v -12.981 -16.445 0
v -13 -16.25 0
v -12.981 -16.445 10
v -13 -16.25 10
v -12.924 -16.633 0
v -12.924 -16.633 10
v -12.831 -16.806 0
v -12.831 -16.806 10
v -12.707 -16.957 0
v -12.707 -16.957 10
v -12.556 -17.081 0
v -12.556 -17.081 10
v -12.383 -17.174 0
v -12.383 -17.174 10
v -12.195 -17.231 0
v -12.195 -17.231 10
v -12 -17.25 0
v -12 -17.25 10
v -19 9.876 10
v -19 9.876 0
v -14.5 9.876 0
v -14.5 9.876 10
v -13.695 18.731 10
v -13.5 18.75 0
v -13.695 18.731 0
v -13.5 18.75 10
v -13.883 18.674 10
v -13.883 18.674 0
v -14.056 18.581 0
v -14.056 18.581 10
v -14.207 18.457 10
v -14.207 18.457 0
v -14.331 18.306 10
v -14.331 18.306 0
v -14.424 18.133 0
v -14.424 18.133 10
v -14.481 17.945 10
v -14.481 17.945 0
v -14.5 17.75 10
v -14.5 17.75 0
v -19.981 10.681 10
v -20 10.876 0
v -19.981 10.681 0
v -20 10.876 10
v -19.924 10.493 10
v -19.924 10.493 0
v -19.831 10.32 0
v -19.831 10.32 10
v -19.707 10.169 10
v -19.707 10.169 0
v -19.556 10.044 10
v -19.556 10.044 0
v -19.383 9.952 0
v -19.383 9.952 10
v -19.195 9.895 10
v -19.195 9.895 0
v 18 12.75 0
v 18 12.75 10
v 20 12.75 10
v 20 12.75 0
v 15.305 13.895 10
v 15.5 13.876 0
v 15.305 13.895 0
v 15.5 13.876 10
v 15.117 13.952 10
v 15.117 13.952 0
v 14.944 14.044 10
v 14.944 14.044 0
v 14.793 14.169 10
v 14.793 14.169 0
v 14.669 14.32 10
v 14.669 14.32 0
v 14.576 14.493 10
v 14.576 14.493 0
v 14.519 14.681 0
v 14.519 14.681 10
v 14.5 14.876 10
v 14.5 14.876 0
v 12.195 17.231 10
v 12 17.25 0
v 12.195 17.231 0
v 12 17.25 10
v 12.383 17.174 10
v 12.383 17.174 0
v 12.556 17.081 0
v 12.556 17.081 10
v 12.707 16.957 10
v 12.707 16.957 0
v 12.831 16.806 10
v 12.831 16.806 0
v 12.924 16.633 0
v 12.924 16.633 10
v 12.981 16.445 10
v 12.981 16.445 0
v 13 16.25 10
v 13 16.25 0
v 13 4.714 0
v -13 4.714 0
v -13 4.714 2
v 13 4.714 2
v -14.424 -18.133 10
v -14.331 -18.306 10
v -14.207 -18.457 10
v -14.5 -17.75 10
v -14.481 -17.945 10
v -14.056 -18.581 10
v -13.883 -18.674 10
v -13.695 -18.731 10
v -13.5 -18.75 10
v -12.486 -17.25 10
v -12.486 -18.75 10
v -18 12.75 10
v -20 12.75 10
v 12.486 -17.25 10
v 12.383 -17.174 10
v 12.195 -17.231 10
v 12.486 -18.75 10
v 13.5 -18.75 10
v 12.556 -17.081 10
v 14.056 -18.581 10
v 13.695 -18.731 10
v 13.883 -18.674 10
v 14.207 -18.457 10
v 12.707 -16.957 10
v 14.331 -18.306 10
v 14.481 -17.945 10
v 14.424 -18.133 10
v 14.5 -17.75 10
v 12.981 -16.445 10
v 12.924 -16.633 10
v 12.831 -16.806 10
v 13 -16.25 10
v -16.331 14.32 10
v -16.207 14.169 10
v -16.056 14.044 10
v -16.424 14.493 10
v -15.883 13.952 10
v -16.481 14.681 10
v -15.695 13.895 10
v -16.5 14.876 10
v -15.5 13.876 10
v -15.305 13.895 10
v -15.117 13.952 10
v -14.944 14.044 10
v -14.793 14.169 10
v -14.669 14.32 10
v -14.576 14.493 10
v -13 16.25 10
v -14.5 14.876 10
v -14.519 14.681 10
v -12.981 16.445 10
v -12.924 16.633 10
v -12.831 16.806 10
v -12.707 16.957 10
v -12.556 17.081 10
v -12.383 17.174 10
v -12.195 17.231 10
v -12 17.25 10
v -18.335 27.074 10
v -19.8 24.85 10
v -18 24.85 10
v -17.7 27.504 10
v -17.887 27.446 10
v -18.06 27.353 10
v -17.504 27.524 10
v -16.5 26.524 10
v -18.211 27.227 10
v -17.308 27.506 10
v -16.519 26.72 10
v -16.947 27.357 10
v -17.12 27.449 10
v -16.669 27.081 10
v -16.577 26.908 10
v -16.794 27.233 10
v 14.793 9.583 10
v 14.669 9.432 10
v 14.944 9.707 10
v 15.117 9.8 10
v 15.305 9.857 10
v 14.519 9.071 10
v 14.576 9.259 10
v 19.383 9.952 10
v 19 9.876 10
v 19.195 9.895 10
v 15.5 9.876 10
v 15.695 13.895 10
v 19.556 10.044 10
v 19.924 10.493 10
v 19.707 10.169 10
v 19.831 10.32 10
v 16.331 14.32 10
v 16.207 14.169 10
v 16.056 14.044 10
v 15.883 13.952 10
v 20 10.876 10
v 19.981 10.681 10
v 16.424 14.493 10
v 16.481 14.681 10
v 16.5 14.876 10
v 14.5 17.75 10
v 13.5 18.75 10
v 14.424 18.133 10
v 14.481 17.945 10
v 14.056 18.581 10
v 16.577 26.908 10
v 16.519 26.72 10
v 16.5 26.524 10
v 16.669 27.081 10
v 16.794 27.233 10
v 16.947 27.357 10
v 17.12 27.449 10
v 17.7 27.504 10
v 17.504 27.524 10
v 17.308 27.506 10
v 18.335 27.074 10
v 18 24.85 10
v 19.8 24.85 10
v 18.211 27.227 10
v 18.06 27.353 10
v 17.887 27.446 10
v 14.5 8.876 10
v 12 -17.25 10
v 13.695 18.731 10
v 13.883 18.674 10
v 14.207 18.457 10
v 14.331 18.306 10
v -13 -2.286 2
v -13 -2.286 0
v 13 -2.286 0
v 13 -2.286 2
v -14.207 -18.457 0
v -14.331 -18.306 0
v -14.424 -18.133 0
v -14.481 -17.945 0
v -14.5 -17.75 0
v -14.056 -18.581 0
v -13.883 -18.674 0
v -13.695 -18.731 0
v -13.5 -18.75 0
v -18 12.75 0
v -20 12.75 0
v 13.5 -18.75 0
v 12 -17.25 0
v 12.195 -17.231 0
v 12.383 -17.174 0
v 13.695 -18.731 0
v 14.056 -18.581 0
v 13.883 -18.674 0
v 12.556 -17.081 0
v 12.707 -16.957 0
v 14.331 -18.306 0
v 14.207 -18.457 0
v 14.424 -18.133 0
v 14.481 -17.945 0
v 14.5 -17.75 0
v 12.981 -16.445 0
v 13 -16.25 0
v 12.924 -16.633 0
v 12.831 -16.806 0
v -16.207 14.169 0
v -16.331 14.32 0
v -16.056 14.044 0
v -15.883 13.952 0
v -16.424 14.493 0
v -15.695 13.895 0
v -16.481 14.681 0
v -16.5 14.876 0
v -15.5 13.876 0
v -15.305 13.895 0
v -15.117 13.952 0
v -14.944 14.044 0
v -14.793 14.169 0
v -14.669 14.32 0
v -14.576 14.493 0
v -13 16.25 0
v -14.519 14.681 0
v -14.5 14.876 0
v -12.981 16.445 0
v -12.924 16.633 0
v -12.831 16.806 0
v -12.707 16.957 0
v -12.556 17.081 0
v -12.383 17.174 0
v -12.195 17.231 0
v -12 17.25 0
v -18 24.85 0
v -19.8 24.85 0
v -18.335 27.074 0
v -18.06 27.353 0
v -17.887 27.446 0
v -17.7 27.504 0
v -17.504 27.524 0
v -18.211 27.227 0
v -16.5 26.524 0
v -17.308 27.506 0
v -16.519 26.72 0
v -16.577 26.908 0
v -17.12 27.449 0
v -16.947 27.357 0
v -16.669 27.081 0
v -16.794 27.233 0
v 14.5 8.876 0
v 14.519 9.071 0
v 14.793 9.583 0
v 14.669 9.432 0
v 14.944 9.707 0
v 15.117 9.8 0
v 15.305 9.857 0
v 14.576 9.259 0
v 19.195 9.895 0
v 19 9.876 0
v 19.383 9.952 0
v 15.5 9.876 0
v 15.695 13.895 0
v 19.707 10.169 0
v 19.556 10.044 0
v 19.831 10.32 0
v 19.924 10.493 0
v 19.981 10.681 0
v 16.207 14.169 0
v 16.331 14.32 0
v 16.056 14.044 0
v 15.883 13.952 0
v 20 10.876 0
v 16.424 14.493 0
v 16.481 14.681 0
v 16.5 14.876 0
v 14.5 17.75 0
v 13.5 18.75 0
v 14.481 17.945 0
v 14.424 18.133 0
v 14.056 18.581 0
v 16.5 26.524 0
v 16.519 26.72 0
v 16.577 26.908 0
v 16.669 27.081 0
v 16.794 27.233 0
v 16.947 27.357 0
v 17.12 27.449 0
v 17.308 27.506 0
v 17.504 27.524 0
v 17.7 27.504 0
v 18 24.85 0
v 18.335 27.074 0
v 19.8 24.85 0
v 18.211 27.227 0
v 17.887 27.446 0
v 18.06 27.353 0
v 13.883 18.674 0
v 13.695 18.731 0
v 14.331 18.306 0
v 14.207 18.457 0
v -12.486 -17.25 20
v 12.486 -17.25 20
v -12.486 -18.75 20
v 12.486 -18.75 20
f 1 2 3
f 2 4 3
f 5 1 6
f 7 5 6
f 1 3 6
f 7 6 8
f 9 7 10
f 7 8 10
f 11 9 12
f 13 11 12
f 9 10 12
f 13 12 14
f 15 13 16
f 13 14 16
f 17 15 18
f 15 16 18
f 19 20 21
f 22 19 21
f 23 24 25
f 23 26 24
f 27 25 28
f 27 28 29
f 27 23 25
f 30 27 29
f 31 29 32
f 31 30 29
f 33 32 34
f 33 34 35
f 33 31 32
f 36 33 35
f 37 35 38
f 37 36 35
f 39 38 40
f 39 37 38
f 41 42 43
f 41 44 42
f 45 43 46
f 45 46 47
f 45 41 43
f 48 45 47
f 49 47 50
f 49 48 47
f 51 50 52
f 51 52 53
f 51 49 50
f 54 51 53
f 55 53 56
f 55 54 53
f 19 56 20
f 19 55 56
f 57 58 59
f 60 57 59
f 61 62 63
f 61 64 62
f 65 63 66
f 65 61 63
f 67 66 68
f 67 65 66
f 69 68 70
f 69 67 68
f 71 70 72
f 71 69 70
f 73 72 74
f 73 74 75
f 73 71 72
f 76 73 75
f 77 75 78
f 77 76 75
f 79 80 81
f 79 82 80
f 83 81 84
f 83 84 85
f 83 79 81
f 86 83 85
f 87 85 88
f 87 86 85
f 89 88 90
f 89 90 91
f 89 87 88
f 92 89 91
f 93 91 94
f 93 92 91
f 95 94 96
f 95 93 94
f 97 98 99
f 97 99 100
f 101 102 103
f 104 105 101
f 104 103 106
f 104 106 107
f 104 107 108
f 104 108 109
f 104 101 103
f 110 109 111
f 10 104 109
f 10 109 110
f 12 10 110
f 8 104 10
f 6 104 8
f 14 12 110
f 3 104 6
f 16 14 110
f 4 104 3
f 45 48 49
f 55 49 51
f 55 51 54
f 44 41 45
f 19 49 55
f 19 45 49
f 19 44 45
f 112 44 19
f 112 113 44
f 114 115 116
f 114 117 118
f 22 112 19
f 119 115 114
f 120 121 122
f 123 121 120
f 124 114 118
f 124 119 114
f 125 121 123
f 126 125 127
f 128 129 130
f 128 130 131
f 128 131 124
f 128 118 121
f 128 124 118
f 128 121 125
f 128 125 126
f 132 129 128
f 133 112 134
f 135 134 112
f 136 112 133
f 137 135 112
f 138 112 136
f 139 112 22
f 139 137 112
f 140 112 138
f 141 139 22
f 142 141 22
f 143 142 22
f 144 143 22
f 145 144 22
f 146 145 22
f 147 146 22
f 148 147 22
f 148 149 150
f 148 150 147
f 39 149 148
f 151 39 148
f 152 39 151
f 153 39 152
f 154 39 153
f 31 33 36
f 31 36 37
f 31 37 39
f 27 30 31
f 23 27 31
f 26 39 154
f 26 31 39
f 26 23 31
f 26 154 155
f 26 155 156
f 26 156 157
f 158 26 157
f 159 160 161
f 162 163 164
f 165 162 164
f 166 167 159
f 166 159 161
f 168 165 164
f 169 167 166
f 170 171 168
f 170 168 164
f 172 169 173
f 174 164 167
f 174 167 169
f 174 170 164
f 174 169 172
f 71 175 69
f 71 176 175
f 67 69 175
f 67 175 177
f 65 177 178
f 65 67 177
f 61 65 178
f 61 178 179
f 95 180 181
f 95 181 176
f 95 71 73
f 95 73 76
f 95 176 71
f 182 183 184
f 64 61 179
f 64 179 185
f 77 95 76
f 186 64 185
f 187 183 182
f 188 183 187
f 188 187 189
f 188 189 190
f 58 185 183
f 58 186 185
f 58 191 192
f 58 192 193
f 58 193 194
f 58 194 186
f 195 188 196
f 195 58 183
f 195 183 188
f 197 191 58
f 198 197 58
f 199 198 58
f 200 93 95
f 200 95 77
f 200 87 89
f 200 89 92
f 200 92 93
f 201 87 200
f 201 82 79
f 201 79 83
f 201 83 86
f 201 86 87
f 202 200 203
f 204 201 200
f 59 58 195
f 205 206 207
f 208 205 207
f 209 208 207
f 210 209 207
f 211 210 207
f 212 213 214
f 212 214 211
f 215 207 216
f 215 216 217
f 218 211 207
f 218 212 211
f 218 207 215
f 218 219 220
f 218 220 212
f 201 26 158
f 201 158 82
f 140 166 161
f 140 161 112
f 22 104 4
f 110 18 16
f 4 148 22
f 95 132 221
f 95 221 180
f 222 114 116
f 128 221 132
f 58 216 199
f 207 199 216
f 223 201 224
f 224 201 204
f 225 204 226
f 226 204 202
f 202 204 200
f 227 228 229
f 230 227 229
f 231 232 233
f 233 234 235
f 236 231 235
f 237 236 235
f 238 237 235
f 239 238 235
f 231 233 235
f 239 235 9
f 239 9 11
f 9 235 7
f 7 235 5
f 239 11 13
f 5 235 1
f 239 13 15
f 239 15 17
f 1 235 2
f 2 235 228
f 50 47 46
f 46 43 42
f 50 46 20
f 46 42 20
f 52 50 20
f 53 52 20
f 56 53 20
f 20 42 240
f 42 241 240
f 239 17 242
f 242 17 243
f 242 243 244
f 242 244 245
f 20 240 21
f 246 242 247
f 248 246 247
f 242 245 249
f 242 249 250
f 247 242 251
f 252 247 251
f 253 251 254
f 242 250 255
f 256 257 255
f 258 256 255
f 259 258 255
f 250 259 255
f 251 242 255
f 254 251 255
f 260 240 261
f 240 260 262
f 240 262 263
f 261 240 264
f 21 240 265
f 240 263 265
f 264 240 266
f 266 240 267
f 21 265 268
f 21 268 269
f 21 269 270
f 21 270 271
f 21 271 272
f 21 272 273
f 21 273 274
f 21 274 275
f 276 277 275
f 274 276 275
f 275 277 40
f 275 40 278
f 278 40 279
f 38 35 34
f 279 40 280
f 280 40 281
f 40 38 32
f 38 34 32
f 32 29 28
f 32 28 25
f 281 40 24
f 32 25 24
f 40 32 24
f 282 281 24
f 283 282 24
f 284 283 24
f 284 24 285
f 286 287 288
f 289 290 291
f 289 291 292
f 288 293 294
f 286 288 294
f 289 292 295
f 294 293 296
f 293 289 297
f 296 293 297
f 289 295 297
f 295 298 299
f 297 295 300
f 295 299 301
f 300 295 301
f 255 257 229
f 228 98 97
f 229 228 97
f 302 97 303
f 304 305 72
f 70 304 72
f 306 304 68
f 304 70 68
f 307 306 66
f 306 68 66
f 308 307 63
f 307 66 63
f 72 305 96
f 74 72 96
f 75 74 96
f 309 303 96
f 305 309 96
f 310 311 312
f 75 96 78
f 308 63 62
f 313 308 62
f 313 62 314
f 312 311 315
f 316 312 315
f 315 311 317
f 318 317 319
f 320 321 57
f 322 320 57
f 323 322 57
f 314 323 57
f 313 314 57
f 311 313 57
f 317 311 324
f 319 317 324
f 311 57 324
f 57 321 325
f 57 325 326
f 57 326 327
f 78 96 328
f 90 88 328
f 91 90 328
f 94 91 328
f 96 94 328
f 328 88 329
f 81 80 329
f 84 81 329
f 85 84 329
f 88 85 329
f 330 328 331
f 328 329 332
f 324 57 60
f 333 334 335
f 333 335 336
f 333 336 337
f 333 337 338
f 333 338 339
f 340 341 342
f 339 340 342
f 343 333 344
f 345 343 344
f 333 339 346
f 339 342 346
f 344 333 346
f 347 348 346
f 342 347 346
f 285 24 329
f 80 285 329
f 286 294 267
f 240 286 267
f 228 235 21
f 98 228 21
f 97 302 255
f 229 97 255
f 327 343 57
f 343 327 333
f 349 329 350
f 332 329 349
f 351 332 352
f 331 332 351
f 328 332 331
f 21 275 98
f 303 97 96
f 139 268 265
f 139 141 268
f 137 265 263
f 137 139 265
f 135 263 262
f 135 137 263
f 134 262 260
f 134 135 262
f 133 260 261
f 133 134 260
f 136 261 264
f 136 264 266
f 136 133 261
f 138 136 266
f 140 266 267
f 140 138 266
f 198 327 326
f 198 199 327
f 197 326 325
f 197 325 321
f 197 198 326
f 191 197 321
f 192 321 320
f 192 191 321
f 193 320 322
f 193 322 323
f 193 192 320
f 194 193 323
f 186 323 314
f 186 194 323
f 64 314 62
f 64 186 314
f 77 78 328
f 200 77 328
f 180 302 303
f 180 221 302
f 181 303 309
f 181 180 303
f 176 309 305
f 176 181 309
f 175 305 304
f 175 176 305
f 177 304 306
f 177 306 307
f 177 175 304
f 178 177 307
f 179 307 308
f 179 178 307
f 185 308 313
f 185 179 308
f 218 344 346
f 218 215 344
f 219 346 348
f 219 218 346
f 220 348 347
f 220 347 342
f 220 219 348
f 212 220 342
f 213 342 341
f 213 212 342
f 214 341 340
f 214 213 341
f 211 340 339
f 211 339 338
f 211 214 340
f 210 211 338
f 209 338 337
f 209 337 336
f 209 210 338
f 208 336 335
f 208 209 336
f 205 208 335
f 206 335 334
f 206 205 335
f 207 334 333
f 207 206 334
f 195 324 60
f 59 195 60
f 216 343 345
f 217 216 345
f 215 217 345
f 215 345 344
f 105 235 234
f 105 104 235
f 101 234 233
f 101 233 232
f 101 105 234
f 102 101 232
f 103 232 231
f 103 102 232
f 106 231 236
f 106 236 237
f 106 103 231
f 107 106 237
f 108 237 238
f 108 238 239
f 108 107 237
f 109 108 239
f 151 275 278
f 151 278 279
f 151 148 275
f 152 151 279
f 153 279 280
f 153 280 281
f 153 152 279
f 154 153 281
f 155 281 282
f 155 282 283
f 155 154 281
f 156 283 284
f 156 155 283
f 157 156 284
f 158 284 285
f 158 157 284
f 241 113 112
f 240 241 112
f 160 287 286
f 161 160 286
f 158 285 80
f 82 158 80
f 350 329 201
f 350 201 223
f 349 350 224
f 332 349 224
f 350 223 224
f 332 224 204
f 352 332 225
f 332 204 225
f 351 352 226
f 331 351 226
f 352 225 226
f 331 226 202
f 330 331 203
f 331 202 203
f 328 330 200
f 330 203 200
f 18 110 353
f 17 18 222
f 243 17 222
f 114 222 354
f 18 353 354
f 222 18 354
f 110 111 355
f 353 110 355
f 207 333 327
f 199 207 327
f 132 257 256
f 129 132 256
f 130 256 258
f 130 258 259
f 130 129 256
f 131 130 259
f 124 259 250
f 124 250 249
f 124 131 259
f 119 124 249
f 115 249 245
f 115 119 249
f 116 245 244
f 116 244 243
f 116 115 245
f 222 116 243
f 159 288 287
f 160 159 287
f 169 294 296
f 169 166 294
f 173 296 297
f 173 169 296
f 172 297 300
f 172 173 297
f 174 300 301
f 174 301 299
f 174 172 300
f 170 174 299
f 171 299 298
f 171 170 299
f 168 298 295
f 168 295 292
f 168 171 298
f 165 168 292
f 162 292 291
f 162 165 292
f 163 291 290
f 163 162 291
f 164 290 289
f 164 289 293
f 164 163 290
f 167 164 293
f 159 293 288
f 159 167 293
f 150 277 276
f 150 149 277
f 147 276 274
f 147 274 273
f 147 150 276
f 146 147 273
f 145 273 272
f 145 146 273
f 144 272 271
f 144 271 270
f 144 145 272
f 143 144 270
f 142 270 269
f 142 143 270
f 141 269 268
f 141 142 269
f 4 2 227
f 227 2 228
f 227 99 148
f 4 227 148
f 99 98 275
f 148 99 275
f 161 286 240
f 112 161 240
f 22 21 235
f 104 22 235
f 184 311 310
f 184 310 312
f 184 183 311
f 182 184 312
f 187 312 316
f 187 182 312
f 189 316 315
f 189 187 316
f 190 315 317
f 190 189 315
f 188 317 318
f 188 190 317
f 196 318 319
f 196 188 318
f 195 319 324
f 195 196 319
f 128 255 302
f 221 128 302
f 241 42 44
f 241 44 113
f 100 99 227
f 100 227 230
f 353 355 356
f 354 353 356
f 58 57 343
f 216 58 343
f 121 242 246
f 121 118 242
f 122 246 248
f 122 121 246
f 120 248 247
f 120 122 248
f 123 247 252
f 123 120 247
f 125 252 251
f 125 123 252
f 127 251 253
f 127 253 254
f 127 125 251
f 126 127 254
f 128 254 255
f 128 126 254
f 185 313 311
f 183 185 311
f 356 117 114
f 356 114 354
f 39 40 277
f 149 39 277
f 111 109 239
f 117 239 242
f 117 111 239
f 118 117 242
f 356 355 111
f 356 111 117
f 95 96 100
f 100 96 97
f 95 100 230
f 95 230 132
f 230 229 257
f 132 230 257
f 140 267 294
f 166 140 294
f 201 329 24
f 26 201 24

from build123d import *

# Parameters (mm, degrees)
F0_W     = 2
F0_H     = 4
F0_H_2   = 2.8740456328
F1_DEPTH = 10
F2_R     = 0.99999
F0_W_2   = 26
F0_H_3   = 7
F3_DEPTH = 2
F4_W     = 24.9721305105
F4_H     = 10
F5_DEPTH = 1.5


# Not quite as in the source:
# - a fillet or chamfer is up to 0.001 mm smaller than in the source, because OpenCascade refuses the exact size


with BuildPart() as f1:
    # F0 (on Top) → F1 (new body)
    with BuildSketch(Plane.XY):
        Polygon((14.5, 18.75), (-14.5, 18.75), (-14.5, 13.8759543672), (-14.5, 9.8759543672), (-14.5, -18.75), (14.5, -18.75), (14.5, 9.8759543672), (14.5, 13.8759543672), align=None)
        Polygon((-13, 4.7144976147), (-13, 17.25), (13, 17.25), (13, 4.7144976147), (13, -2.2855023853), (13, -17.25), (-13, -17.25), (-13, -2.2855023853), align=None, mode=Mode.SUBTRACT)
        with Locations((-15.5, 11.8759543672)):
            Rectangle(F0_W, F0_H)
        Polygon((-16.5, 9.8759543672), (-16.5, 13.8759543672), (-16.5, 29.8609879265), (-19.8, 24.85), (-18, 24.85), (-18, 12.75), (-18, 9.8759543672), align=None)
        with Locations((15.5, 11.8759543672)):
            Rectangle(F0_W, F0_H)
        Polygon((16.5, 29.8609879265), (16.5, 13.8759543672), (16.5, 9.8759543672), (18, 9.8759543672), (18, 12.75), (18, 24.85), (19.8, 24.85), align=None)
        with Locations((-19, 11.3129771836)):
            Rectangle(F0_W, F0_H_2)
        with Locations((19, 11.3129771836)):
            Rectangle(F0_W, F0_H_2)
    extrude(amount=F1_DEPTH)

    # F2 (radius 1 in the source; OpenCascade refuses exactly that, so slightly less here)
    f2_edges = [f1.edges().sort_by_distance(p)[0] for p in [
        (-14.5, 18.75, 5),
        (-20, 9.875954, 5),
        (14.5, 18.75, 5),
        (20, 9.875954, 5),
        (-13, 17.25, 5),
        (14.5, 9.875954, 5),
        (14.5, -18.75, 5),
        (-14.5, -18.75, 5),
        (-13, -17.25, 5),
        (13, 17.25, 5),
        (13, -17.25, 5),
        (-14.5, 13.875954, 5),
        (16.5, 13.875954, 5),
        (-16.5, 13.875954, 5),
        (14.5, 13.875954, 5),
        (-16.5, 29.860988, 5),
        (16.5, 29.860988, 5),
    ]]
    fillet(f2_edges, radius=F2_R)

    # F0 (on Top) → F3 (join)
    with BuildSketch(Plane.XY):
        with Locations((0, 1.2144976147)):
            Rectangle(F0_W_2, F0_H_3)
    extrude(amount=F3_DEPTH)

    # F4 (on face) → F5 (join)
    with BuildSketch(Plane.XZ.offset(18.75)):
        with Locations((0, 15)):
            Rectangle(F4_W, F4_H)
    extrude(amount=-F5_DEPTH)


solid = f1.part
